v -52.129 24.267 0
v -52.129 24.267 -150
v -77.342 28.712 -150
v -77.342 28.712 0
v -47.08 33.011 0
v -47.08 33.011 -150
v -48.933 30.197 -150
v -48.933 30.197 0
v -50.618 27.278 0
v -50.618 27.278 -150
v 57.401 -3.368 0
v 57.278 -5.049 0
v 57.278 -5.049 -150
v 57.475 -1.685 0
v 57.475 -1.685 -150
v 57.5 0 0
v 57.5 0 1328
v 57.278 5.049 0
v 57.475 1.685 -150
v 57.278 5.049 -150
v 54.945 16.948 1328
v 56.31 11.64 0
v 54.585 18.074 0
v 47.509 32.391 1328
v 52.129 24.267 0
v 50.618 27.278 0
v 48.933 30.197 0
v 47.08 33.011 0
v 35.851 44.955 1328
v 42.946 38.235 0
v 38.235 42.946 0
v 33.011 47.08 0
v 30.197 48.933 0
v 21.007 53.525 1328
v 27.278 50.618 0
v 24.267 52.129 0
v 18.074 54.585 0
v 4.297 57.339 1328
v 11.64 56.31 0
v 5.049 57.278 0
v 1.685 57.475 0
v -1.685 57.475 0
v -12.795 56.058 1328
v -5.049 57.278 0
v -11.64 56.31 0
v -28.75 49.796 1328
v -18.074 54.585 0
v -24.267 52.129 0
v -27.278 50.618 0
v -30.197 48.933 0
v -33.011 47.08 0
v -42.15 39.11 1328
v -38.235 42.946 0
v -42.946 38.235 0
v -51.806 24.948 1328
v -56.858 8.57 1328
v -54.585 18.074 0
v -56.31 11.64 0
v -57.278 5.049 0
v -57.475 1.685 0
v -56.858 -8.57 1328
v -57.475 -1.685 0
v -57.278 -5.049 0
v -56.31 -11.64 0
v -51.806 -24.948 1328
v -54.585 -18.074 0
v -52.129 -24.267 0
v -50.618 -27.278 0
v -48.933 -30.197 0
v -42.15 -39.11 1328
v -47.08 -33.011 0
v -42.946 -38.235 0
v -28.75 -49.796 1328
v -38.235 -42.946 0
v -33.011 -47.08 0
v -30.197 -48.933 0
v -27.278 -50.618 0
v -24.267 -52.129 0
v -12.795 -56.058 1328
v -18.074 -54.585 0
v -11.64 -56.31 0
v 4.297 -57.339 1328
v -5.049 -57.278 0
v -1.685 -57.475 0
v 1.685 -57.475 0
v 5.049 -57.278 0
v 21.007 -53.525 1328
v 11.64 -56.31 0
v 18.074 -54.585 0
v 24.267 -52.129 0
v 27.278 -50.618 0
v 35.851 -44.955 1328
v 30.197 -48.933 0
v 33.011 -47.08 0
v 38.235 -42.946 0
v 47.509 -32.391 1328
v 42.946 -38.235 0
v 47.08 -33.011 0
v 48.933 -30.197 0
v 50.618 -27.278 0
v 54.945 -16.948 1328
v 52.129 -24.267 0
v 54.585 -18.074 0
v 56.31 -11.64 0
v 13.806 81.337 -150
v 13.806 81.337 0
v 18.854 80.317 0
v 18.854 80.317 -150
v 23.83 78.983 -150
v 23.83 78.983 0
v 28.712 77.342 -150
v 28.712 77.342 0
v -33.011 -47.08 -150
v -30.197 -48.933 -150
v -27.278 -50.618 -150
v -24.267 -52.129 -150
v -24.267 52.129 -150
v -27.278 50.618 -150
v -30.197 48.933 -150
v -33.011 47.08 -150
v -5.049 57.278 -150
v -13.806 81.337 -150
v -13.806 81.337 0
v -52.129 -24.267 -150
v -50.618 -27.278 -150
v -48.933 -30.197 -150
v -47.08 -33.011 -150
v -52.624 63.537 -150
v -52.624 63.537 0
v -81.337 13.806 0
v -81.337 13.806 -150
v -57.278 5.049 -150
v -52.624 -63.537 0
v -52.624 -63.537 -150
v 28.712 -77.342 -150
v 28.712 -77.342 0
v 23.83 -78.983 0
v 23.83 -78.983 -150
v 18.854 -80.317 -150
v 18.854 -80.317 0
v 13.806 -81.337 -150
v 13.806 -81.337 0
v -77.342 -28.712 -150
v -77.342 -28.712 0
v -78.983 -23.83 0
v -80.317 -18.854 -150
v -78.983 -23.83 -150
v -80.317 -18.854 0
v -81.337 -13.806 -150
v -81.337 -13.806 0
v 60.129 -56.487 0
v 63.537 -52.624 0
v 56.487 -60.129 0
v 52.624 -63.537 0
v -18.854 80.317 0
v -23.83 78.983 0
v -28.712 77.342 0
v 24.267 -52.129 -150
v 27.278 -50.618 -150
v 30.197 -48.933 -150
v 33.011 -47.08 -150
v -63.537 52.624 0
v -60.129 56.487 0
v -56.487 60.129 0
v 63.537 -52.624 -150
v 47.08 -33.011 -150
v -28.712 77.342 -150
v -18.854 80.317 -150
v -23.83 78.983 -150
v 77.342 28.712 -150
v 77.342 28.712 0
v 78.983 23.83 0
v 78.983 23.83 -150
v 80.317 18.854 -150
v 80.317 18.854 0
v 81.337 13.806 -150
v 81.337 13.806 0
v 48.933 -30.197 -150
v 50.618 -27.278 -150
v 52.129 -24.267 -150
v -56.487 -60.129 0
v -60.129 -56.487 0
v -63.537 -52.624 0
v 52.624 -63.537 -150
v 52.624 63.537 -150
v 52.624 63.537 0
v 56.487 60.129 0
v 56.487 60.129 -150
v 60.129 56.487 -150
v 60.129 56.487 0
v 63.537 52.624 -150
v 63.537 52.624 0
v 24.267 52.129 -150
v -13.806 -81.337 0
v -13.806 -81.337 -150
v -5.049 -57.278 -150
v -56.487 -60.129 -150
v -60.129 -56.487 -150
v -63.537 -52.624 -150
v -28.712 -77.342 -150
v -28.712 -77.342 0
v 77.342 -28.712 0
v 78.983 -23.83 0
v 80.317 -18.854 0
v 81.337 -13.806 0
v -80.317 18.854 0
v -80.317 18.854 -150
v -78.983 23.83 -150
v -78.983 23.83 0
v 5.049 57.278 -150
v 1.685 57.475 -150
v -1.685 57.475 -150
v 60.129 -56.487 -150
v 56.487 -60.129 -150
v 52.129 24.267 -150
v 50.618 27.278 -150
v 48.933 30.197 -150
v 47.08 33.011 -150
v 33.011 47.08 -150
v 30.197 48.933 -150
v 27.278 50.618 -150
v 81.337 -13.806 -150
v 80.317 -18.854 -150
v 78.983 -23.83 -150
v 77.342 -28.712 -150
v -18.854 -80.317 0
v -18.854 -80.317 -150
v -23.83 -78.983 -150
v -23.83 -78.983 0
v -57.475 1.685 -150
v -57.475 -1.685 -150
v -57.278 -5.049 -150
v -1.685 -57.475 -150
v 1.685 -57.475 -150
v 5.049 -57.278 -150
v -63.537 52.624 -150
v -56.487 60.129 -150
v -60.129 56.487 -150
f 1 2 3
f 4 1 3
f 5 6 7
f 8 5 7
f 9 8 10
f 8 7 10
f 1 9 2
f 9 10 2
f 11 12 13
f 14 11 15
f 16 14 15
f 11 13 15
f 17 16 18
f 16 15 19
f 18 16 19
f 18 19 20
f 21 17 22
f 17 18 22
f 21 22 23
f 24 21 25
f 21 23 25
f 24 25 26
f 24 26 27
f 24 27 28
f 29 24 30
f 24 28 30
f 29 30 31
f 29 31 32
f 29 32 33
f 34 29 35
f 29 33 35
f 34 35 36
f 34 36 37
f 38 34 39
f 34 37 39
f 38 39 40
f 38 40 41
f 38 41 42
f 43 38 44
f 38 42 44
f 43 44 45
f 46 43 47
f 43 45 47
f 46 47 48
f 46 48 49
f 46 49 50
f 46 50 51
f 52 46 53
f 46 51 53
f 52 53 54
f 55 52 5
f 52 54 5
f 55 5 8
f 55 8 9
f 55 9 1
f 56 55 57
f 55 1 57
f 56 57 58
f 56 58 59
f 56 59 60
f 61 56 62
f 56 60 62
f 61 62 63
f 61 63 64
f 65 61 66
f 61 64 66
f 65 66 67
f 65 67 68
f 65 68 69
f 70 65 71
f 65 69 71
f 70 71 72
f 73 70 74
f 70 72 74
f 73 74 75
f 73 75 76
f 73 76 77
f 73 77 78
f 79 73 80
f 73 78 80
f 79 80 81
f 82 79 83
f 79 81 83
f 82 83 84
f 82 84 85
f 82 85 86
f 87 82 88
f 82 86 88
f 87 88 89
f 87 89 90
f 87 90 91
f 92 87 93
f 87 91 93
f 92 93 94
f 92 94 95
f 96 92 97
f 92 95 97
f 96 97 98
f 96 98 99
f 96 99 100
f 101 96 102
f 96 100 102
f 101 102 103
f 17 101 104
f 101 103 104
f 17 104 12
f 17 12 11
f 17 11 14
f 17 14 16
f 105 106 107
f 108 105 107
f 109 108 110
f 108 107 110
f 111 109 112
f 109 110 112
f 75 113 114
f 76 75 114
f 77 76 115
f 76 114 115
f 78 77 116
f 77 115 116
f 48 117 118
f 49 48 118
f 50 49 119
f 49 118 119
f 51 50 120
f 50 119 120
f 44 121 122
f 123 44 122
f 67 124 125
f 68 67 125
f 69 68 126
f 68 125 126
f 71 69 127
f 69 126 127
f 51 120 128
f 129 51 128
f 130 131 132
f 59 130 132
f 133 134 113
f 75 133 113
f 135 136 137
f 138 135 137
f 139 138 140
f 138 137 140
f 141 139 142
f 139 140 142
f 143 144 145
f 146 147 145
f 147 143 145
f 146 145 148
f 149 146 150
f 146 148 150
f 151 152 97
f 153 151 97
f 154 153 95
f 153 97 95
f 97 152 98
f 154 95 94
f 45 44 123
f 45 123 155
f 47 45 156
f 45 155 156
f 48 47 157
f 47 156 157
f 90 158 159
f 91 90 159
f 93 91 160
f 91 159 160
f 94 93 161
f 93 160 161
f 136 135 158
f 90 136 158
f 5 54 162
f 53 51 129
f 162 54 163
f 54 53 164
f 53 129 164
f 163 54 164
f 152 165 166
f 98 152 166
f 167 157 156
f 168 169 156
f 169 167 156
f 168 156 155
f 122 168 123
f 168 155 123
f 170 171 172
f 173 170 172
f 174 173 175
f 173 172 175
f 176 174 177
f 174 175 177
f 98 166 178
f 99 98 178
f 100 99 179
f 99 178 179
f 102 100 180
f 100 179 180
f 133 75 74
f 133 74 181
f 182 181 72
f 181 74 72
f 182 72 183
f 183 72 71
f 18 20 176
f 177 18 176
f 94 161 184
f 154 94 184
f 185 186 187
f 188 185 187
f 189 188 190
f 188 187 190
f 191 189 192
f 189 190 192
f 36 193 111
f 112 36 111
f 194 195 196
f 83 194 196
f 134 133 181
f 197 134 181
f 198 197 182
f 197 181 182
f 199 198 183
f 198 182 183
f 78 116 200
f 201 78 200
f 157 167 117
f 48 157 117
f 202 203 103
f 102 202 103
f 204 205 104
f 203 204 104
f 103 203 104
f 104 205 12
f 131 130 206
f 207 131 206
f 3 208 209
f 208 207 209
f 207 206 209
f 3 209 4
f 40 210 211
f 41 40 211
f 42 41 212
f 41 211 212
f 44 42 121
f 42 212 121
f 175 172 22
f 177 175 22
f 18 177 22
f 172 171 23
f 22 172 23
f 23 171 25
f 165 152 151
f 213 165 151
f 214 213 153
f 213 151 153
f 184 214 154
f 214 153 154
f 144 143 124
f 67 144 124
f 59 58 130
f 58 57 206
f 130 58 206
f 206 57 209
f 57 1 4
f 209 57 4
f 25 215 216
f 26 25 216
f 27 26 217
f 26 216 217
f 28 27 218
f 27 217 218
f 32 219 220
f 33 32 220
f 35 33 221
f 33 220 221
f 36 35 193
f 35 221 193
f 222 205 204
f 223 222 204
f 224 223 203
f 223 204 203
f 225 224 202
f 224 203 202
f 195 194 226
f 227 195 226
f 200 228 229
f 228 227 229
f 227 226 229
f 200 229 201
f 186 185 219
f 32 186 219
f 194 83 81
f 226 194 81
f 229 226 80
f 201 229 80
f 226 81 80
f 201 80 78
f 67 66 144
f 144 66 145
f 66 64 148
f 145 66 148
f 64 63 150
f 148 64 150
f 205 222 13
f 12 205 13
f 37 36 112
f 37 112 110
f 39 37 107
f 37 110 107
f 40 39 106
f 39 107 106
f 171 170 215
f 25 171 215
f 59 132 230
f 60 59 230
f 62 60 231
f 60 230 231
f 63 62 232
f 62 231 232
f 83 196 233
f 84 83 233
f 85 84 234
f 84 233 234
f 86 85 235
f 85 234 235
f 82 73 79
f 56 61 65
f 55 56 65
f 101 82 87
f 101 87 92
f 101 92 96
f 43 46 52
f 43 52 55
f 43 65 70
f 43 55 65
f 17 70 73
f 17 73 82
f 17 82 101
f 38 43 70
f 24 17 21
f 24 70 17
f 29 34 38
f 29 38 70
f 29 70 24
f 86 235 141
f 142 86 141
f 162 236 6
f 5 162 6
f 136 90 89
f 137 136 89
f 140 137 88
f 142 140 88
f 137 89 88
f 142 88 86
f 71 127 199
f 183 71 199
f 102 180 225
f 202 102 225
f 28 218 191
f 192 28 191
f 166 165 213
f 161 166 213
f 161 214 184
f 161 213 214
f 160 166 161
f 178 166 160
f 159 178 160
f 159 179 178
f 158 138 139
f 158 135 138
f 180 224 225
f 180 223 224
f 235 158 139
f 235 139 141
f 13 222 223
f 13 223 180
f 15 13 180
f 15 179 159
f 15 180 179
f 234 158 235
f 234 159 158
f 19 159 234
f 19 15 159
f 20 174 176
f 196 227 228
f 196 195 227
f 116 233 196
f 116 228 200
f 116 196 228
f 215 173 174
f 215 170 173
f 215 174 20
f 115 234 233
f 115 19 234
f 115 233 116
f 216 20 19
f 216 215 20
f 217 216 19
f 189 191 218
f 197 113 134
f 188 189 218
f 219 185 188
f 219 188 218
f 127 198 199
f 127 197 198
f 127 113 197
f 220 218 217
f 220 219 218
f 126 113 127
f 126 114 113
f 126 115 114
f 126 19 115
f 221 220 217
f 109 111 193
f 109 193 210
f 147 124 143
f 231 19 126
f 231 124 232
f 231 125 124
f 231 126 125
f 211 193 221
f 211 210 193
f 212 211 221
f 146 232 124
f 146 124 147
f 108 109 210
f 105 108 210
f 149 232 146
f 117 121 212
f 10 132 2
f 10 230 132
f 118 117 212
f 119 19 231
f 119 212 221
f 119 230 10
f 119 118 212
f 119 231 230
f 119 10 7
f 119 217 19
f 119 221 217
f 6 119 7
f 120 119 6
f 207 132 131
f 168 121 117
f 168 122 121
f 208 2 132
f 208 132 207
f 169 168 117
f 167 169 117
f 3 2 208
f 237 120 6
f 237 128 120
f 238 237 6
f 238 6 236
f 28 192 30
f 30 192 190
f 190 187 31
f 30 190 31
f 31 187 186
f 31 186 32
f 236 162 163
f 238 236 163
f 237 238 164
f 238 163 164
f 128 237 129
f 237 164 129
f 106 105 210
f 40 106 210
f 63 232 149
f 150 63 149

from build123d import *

# Parameters (mm, degrees)
SKETCH1_R           = 57.5
BOSS_EXTRUDE1_DEPTH = 1328
SKETCH3_R           = 82.5
BOSS_EXTRUDE2_DEPTH = 150
CUT_EXTRUDE1_DEPTH  = 150
CIRPATTERN1_COUNT   = 12


with BuildPart() as part:
    # Sketch1 → Boss-Extrude1 (new body)
    with BuildSketch(Plane.XY):
        Circle(SKETCH1_R)
    extrude(amount=BOSS_EXTRUDE1_DEPTH)

    # Sketch3 → Boss-Extrude2 (add)
    with BuildSketch(Plane(origin=(0, 0, 0), x_dir=(-1, 0, 0), z_dir=(0, 0, -1))):
        Circle(SKETCH3_R)
    extrude(amount=BOSS_EXTRUDE2_DEPTH)

    # Sketch5 → Cut-Extrude1 (cut)
    with BuildSketch(Plane(origin=(0, 0, -150), x_dir=(-1, 0, 0), z_dir=(0, 0, -1))):
        with BuildLine():
            Line((-13.805552215, 81.336687467), (-5.048873049, 57.277909188))
            ThreePointArc((-5.048873049, 57.277909188), (0, 57.5), (5.048873049, 57.277909188))
            Line((5.048873049, 57.277909188), (13.805552215, 81.336687467))
            ThreePointArc((13.805552215, 81.336687467), (0, 82.5), (-13.805552215, 81.336687467))
        make_face()
    cut_extrude1 = extrude(amount=-CUT_EXTRUDE1_DEPTH, mode=Mode.SUBTRACT)

    # CirPattern1: Cut-Extrude1 ×12 about axis
    cirpattern1_axis = Axis((0, 0, 0), (0, 0, 1))
    for i in range(1, CIRPATTERN1_COUNT):
        add(cut_extrude1.rotate(cirpattern1_axis, i * 360 / CIRPATTERN1_COUNT), mode=Mode.SUBTRACT)


solid = part.part
